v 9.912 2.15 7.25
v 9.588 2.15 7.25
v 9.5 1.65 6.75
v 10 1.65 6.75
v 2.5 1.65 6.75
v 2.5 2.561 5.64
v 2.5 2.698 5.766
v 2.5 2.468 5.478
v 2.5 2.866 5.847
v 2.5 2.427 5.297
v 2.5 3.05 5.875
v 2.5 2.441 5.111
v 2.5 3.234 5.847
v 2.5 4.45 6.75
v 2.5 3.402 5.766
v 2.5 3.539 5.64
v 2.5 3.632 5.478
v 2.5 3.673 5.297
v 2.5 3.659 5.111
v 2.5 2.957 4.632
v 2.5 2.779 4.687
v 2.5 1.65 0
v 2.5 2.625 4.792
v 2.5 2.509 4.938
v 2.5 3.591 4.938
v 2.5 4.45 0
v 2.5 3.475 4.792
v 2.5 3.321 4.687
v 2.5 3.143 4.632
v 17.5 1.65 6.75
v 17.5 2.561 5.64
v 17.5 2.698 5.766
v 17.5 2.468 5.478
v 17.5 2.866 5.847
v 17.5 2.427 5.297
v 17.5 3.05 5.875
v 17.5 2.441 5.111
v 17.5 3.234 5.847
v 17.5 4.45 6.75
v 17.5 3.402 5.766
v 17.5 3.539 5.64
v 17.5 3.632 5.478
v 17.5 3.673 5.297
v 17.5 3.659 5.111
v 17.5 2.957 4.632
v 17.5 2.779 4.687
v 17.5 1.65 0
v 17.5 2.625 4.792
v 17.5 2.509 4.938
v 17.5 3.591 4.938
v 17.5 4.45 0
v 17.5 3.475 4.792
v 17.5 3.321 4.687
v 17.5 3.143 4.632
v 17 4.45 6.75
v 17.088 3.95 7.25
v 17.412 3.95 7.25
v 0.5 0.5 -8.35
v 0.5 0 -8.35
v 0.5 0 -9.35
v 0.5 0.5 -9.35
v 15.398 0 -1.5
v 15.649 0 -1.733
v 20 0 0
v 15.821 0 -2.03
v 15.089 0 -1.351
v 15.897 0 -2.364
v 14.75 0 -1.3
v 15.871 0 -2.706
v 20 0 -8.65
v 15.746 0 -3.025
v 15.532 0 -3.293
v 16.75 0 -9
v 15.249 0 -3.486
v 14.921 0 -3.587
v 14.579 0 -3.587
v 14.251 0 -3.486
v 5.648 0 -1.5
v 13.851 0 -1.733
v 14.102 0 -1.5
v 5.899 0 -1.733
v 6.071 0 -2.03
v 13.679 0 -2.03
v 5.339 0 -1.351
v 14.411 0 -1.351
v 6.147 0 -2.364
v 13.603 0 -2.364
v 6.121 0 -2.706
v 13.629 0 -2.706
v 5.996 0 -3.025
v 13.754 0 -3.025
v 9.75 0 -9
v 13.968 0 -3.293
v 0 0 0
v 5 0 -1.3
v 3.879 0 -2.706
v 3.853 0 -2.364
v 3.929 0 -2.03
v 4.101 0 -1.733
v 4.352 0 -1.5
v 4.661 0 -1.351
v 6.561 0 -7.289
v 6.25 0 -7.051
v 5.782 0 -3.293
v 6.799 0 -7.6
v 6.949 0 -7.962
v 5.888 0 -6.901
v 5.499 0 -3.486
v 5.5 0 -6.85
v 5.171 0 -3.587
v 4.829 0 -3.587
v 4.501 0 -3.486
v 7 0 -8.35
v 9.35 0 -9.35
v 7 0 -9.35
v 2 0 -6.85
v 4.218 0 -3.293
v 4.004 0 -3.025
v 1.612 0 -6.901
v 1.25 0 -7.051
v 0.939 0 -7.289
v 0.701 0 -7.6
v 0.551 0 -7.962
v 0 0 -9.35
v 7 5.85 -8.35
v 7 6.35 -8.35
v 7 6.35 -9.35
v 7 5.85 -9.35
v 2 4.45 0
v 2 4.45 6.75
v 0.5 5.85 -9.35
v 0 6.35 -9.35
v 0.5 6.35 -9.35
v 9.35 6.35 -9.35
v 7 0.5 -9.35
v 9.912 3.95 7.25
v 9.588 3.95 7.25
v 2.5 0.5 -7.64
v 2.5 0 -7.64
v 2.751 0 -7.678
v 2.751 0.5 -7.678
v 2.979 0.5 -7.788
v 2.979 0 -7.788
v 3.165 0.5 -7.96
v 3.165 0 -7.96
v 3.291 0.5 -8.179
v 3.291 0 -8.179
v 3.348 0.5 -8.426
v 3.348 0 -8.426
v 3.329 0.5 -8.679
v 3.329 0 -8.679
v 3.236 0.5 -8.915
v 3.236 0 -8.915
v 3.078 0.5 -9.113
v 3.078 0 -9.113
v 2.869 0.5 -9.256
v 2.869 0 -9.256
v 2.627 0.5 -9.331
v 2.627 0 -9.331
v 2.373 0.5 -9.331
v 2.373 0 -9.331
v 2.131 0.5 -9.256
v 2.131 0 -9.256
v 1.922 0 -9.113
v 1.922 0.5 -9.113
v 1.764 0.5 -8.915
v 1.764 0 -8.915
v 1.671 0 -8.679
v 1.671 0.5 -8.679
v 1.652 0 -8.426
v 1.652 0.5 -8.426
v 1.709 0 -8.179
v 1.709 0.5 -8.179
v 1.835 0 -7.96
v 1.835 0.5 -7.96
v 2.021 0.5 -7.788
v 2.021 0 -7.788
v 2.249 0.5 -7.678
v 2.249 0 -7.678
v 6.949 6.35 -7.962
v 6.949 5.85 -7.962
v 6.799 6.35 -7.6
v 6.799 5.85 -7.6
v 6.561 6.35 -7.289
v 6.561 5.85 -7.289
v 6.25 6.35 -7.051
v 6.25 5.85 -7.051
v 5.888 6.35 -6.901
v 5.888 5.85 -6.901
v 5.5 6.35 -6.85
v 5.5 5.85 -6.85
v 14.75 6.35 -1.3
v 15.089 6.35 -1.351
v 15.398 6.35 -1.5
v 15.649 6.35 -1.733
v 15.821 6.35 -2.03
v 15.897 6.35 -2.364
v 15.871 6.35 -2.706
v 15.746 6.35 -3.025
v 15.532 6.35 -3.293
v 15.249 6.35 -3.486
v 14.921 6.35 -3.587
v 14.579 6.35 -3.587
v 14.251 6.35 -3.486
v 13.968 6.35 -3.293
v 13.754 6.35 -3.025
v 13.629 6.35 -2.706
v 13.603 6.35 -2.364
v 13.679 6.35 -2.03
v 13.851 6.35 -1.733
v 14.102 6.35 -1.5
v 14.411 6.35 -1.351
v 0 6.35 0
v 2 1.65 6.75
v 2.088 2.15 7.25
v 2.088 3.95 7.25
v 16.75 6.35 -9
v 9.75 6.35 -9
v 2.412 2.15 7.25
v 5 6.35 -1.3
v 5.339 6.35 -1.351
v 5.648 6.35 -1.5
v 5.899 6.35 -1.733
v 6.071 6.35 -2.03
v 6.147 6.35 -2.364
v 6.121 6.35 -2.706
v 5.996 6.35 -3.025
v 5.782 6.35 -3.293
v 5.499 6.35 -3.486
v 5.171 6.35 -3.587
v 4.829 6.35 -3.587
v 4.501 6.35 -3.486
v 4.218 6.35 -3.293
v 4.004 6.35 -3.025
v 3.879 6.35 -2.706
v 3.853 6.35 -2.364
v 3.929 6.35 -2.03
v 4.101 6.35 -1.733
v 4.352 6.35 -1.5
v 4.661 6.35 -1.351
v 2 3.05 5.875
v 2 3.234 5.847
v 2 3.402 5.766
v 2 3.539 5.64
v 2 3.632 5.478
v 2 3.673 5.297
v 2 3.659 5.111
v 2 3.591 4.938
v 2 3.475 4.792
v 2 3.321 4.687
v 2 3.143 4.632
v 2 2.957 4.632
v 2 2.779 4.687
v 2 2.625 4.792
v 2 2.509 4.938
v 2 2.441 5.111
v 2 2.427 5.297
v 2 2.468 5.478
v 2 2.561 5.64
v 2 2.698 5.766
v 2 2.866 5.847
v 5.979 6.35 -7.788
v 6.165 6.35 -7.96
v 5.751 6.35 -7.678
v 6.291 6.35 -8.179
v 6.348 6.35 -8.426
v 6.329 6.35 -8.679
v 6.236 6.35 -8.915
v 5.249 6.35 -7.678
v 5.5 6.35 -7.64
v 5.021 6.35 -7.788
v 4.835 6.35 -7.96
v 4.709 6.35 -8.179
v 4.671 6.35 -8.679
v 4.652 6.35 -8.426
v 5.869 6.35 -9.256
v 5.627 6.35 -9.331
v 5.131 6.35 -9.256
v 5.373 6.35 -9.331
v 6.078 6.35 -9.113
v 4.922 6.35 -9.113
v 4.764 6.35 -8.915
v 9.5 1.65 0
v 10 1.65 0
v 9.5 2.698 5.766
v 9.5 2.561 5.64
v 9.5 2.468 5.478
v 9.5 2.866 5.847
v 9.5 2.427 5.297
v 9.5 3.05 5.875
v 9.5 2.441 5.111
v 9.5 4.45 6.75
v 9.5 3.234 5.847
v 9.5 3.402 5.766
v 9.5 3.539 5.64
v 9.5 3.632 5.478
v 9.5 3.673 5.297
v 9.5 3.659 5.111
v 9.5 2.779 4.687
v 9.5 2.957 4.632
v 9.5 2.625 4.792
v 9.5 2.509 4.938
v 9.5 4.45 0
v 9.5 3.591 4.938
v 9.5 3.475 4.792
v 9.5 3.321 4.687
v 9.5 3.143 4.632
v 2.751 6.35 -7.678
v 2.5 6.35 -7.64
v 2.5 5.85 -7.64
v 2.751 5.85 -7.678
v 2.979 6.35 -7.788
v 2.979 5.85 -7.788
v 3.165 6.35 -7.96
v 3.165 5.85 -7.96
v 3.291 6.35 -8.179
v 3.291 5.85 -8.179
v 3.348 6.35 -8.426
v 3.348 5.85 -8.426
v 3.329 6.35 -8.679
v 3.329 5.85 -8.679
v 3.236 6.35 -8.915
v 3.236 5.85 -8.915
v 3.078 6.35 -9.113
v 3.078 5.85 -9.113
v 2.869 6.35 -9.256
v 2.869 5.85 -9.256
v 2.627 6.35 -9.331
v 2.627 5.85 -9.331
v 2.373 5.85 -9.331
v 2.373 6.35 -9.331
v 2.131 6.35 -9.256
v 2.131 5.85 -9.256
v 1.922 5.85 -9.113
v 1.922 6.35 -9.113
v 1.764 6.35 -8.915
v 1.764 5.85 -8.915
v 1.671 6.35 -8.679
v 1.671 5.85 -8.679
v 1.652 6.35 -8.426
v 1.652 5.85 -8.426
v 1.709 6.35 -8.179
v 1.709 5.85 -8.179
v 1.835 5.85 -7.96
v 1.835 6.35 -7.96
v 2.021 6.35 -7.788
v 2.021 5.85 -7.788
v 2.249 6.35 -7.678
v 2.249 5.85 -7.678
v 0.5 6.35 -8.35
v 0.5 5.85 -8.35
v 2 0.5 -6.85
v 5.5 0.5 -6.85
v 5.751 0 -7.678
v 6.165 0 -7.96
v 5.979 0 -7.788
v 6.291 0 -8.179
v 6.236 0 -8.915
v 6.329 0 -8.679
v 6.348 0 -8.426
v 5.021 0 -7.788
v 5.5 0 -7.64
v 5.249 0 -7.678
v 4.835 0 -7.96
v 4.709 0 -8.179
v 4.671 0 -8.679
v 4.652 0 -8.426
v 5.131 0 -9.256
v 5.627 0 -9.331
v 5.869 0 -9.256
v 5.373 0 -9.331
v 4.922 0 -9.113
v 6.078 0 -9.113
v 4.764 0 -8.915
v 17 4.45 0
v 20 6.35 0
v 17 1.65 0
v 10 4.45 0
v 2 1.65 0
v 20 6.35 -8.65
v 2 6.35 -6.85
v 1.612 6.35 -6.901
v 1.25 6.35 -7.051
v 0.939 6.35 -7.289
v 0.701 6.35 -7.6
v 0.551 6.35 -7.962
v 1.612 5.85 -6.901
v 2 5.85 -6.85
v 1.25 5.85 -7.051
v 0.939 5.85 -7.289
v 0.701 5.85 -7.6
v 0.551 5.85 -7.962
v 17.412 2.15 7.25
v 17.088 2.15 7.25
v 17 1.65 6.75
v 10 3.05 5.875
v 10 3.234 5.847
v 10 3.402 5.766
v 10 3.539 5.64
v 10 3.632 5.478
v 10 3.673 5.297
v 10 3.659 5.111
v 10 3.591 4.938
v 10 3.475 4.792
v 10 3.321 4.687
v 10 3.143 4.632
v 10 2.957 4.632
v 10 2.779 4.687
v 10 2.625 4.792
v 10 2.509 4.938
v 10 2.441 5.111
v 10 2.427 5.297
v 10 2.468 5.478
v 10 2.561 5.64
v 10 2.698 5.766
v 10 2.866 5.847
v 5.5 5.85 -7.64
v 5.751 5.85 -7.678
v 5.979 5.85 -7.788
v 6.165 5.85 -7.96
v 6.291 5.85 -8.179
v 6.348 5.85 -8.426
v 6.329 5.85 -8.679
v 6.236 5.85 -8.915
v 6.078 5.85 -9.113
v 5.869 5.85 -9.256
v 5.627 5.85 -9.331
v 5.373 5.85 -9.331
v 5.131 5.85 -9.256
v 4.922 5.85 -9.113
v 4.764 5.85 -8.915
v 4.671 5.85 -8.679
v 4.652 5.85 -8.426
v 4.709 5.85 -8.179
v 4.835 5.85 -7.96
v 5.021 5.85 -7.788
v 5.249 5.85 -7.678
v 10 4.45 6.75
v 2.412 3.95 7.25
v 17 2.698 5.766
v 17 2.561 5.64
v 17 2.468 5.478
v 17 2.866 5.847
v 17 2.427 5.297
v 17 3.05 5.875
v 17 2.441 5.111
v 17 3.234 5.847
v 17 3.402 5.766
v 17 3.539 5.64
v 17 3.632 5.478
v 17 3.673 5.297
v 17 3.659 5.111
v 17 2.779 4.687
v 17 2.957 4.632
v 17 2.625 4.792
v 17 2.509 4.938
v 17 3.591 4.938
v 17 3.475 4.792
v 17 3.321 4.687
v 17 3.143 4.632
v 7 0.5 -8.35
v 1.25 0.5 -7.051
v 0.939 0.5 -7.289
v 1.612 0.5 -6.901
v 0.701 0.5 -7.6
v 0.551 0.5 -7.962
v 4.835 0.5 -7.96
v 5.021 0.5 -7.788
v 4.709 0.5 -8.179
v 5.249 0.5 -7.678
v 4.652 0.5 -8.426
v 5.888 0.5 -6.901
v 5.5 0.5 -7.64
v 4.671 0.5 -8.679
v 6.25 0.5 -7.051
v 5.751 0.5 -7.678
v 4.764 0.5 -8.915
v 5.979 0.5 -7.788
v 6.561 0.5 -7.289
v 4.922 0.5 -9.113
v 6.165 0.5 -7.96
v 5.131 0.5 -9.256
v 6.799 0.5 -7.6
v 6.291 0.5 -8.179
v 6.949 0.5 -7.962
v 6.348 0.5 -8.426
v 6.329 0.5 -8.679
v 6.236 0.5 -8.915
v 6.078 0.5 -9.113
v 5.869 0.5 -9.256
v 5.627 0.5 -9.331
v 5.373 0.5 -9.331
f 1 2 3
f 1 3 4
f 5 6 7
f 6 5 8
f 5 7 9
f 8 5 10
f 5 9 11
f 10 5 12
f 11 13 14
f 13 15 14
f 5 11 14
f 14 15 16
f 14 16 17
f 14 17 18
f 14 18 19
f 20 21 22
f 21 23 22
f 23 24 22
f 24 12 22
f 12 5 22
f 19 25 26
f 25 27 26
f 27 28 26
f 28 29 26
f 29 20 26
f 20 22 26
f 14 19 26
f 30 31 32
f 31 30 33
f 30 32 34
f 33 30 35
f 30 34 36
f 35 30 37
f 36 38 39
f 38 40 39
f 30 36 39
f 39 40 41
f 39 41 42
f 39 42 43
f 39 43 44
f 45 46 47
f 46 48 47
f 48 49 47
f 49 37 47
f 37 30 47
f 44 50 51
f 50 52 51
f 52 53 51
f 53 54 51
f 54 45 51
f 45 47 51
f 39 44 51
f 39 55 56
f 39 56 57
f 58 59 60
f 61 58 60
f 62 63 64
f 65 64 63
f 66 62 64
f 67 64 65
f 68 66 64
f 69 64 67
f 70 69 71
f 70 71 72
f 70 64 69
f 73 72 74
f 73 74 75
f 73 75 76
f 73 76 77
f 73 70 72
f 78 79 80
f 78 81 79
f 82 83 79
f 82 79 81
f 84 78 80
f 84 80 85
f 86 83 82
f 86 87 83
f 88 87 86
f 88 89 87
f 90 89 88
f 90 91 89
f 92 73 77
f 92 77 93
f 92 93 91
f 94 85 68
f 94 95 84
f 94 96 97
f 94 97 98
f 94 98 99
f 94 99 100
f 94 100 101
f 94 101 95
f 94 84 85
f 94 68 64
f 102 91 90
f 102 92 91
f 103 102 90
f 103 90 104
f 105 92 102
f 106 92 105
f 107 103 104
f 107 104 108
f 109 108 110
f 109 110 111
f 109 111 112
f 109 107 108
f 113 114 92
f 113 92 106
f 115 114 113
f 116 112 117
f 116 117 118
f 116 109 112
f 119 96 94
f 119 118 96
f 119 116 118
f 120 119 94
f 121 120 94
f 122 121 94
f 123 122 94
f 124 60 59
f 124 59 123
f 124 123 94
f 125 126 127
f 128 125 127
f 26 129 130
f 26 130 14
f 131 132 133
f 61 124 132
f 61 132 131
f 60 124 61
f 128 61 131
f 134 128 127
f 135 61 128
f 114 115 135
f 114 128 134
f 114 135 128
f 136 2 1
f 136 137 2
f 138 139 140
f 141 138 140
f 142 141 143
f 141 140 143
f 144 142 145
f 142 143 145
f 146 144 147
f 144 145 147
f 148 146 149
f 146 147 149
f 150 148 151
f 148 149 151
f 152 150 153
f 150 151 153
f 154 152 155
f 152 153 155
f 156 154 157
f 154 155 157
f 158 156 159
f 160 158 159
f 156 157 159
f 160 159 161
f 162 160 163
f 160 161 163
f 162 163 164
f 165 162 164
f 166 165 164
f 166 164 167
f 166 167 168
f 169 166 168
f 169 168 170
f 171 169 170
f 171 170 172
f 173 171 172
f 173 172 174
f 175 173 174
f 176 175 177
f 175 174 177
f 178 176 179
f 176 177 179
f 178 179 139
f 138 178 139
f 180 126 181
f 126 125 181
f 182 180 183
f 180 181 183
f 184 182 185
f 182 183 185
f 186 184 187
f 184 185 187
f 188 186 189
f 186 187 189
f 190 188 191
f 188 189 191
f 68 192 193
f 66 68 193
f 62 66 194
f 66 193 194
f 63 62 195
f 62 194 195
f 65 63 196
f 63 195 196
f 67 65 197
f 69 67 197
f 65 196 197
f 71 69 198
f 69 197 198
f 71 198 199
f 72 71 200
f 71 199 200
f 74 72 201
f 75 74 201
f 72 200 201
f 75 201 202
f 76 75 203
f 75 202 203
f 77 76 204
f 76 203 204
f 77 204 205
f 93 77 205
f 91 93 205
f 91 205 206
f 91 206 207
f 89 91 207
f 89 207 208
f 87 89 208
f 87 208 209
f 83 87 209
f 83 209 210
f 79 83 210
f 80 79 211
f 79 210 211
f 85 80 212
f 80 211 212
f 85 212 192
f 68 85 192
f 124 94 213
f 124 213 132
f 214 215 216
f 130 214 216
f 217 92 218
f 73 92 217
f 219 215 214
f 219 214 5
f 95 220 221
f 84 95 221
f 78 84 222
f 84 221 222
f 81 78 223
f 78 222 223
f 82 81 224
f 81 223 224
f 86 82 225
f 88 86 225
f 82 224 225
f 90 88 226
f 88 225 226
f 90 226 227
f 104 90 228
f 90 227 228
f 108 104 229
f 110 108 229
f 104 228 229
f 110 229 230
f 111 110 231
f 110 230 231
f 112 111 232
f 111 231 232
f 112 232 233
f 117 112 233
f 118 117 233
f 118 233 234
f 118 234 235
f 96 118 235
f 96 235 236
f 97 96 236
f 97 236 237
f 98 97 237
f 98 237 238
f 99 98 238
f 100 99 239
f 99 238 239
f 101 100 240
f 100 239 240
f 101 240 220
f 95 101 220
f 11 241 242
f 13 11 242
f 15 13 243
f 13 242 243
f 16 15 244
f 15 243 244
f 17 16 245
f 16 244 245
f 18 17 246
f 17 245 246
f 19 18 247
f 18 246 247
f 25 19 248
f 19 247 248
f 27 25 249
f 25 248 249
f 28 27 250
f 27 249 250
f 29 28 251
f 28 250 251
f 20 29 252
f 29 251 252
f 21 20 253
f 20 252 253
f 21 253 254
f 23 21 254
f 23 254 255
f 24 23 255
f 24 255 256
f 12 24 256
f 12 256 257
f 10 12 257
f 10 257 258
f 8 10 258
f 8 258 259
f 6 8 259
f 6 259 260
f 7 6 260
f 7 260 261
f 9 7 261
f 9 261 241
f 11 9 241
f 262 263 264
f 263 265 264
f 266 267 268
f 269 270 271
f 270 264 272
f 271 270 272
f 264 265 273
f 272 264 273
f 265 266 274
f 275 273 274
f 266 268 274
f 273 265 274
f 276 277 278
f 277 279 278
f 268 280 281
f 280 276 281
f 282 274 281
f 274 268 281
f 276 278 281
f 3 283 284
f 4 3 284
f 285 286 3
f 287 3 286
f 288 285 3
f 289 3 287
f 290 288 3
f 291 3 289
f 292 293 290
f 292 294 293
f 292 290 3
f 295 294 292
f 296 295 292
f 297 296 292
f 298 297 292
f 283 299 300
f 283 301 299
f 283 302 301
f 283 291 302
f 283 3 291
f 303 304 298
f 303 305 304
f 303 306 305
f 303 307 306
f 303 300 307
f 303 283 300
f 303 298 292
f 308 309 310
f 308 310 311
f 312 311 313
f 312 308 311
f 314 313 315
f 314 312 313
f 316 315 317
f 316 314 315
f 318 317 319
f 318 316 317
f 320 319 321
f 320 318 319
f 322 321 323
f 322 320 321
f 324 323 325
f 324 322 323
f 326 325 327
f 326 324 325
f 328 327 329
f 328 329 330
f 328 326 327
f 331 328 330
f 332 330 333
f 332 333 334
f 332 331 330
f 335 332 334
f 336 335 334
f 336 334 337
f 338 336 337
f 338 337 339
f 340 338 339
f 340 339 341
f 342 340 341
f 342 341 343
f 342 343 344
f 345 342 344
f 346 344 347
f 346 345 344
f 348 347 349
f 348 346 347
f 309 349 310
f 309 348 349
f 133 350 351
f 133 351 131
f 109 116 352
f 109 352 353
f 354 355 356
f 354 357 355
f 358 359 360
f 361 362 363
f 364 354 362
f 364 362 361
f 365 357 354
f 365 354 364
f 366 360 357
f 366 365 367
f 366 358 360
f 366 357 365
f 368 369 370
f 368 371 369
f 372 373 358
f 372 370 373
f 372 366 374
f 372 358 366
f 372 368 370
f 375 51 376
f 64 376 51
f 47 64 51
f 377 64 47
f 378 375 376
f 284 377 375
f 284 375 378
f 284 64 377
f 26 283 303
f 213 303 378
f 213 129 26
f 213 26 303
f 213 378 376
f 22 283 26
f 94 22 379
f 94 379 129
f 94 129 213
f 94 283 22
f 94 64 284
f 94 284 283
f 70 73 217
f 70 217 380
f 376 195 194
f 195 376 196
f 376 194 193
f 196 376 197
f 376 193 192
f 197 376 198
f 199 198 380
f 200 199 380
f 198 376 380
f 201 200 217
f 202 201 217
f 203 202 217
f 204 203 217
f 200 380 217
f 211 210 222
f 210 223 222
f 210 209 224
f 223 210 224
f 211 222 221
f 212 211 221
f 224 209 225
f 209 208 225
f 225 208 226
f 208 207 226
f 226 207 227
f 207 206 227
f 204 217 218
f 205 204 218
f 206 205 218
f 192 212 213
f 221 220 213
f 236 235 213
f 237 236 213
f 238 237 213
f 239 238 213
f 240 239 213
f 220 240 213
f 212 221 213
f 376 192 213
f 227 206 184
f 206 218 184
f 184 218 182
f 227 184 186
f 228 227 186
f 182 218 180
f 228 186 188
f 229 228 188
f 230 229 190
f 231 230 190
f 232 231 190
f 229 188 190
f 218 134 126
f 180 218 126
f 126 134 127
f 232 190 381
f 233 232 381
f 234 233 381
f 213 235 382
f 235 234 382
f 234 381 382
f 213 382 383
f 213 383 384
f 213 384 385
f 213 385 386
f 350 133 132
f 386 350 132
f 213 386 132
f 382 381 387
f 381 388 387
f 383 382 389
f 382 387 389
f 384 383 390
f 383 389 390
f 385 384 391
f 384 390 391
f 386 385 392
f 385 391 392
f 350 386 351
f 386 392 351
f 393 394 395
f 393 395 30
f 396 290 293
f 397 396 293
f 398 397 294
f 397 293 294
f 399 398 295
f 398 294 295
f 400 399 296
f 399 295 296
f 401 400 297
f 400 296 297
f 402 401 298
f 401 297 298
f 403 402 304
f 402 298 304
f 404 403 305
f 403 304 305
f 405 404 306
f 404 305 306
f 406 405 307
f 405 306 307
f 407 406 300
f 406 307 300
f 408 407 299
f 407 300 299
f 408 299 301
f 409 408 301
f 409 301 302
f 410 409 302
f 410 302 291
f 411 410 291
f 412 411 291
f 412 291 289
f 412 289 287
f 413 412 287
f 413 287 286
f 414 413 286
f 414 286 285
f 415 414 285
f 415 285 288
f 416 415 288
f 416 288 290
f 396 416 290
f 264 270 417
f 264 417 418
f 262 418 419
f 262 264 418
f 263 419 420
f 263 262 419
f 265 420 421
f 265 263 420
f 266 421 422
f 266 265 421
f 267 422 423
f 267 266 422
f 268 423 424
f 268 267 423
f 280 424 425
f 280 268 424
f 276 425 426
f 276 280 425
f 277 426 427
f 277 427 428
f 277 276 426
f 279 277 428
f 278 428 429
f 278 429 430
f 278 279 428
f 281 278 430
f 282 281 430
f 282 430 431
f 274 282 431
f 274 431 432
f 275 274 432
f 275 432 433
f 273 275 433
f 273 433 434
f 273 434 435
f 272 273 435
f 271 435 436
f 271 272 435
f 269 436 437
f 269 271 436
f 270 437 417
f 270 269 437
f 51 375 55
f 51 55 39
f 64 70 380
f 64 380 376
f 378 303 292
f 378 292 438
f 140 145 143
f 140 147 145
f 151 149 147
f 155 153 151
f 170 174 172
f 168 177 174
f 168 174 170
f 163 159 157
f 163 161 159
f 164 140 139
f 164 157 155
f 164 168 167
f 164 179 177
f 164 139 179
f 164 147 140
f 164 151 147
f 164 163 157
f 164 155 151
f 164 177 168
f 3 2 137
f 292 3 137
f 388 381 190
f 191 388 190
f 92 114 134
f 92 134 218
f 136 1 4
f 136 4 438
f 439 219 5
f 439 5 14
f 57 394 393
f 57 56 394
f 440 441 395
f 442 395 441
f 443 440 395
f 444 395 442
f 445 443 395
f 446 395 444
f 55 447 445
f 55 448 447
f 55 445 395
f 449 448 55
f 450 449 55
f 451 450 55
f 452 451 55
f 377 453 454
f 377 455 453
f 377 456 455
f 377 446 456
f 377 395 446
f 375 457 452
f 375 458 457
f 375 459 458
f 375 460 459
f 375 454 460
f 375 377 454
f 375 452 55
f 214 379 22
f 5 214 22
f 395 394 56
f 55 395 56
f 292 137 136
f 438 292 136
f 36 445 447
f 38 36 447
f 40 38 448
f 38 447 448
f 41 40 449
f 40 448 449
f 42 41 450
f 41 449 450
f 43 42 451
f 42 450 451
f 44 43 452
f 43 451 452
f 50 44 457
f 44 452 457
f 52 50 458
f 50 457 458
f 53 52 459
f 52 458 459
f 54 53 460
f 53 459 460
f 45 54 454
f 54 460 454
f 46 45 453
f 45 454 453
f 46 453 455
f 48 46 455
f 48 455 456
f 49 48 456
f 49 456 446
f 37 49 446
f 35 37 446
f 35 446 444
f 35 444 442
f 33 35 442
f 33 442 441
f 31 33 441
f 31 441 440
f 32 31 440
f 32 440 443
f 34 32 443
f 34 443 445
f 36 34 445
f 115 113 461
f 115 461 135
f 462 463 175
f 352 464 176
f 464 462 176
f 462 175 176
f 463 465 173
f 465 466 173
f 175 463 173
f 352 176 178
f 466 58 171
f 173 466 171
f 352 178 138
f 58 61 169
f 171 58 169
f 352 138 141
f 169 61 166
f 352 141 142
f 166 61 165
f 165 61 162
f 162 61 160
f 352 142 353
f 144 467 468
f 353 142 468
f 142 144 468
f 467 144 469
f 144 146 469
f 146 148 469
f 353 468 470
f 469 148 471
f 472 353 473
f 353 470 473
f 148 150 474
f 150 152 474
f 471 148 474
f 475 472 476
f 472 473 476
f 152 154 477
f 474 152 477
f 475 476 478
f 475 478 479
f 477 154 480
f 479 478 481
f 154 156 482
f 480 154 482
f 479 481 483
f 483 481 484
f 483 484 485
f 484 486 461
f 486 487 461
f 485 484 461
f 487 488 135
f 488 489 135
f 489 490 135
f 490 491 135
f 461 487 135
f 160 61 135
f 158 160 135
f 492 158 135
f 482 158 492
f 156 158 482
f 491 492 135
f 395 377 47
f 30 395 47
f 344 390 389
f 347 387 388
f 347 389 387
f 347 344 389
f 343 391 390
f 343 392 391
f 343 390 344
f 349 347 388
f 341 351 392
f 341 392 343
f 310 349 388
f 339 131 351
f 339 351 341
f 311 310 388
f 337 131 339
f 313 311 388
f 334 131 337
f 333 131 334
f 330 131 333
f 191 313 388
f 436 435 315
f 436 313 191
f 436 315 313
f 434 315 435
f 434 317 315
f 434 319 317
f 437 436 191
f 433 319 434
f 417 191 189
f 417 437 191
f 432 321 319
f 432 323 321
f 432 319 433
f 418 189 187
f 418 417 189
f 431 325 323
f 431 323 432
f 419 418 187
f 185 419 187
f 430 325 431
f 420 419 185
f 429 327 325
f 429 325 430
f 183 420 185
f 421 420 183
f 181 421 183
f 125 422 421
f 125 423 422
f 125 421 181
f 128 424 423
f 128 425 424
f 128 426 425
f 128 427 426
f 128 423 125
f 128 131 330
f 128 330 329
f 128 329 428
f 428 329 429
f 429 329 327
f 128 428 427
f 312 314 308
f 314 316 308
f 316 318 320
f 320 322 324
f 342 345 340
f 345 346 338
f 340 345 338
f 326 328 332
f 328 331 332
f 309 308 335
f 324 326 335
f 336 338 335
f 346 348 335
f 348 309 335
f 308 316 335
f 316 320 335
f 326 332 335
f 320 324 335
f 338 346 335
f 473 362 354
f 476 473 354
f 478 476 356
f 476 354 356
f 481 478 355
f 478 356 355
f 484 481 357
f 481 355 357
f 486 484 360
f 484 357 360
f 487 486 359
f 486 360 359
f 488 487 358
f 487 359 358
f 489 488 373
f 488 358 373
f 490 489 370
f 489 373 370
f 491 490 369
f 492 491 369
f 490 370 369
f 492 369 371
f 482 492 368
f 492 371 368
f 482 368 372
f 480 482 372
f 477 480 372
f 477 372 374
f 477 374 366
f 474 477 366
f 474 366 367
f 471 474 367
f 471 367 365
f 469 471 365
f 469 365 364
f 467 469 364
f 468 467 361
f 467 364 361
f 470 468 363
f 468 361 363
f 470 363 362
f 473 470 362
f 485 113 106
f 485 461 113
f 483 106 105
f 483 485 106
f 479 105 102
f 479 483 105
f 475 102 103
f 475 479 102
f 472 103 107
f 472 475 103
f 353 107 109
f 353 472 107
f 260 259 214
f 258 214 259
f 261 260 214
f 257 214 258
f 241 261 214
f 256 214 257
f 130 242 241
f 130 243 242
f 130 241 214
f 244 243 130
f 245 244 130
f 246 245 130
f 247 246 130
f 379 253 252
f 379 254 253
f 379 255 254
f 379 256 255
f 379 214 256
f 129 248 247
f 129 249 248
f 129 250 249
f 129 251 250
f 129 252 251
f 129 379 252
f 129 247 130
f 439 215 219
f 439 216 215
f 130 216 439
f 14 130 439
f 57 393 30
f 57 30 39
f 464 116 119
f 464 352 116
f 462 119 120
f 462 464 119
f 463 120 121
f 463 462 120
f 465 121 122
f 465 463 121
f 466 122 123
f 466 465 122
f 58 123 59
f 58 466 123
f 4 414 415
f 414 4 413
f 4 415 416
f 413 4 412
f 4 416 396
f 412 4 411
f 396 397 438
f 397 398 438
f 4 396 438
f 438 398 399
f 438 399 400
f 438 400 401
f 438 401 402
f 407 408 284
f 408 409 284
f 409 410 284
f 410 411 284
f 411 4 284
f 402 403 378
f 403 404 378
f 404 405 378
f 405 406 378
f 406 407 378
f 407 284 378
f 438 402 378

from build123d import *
from OCP.BRepFilletAPI import BRepFilletAPI_MakeChamfer

# Parameters (mm, degrees)
BOSS_EXTRUDE1_DEPTH = 6.35
SKETCH2_R           = 1.15
CUT_EXTRUDE1_DEPTH  = 6.35
SKETCH3_W           = 0.5
SKETCH3_H           = 2.8
BOSS_EXTRUDE2_DEPTH = 7.25
SKETCH4_R           = 0.625
CUT_EXTRUDE2_DEPTH  = 16.25
CHAMFER1_SIZE       = 0.5
CHAMFER2_SIZE       = 0.5
CHAMFER2_SIZE2      = 0.08816349
SKETCH5_W           = 6.5
SKETCH5_H           = 2.5
SKETCH5_R           = 0.85
CUT_EXTRUDE4_DEPTH  = 0.5
FILLET1_R           = 1.5


with BuildPart() as part:
    # Sketch1 → Boss-Extrude1 (new body)
    with BuildSketch(Plane(origin=(0, 0, 0), x_dir=(1, 0, 0), z_dir=(0, 1, 0))):
        Polygon((9.35, 9.35), (9.75, 9), (16.75, 9), (20, 8.65), (20, 0), (0, 0), (0, 9.35), align=None)
    extrude(amount=BOSS_EXTRUDE1_DEPTH)

    # Sketch2 → Cut-Extrude1 (cut)
    with BuildSketch(Plane(origin=(0, 6.35, 0), x_dir=(1, 0, 0), z_dir=(0, 1, 0))):
        with Locations(Location((14.75, 2.45, 0), (0, 0, 270))):
            Circle(SKETCH2_R)
        with Locations(Location((5, 2.45, 0), (0, 0, 270))):
            Circle(SKETCH2_R)
    extrude(amount=-CUT_EXTRUDE1_DEPTH, mode=Mode.SUBTRACT)

    # Sketch3 → Boss-Extrude2 (add)
    with BuildSketch(Plane.XY):
        with Locations((2.25, 3.05)):
            Rectangle(SKETCH3_W, SKETCH3_H)
        with Locations((9.75, 3.05)):
            Rectangle(SKETCH3_W, SKETCH3_H)
        with Locations((17.25, 3.05)):
            Rectangle(SKETCH3_W, SKETCH3_H)
    extrude(amount=BOSS_EXTRUDE2_DEPTH)

    # Sketch4 → Cut-Extrude2 (cut)
    with BuildSketch(Plane.ZY.offset(-2)):
        with Locations((5.25, 3.05)):
            Circle(SKETCH4_R)
    extrude(amount=-CUT_EXTRUDE2_DEPTH, mode=Mode.SUBTRACT)

    # Chamfer1
    chamfer1_edges = [part.edges().sort_by_distance(p)[0] for p in [
        (2.25, 4.45, 7.25),
        (2.25, 1.65, 7.25),
        (9.75, 1.65, 7.25),
        (9.75, 4.45, 7.25),
        (17.25, 1.65, 7.25),
        (17.25, 4.45, 7.25),
    ]]
    chamfer(chamfer1_edges, length=CHAMFER1_SIZE)

    # Chamfer2: one chamfer whose edges measure the first distance from different faces: ONE call of the kernel's chamfer builder (chamfer() names one face for all edges)
    chamfer2_edges_1 = [part.edges().sort_by_distance(p)[0] for p in [
        (2.5, 3.05, 7.25),
    ]]
    chamfer2_side_1 = [part.faces().sort_by_distance(p)[0] for p in [
        (2.5, 3.05, 3.473122701),
    ]]
    chamfer2_edges_2 = [part.edges().sort_by_distance(p)[0] for p in [
        (2, 3.05, 7.25),
    ]]
    chamfer2_side_2 = [part.faces().sort_by_distance(p)[0] for p in [
        (2, 3.05, 3.473122701),
    ]]
    chamfer2_edges_3 = [part.edges().sort_by_distance(p)[0] for p in [
        (9.5, 3.05, 7.25),
    ]]
    chamfer2_side_3 = [part.faces().sort_by_distance(p)[0] for p in [
        (9.5, 3.05, 3.473122701),
    ]]
    chamfer2_edges_4 = [part.edges().sort_by_distance(p)[0] for p in [
        (10, 3.05, 7.25),
    ]]
    chamfer2_side_4 = [part.faces().sort_by_distance(p)[0] for p in [
        (10, 3.05, 3.473122701),
    ]]
    chamfer2_edges_5 = [part.edges().sort_by_distance(p)[0] for p in [
        (17, 3.05, 7.25),
    ]]
    chamfer2_side_5 = [part.faces().sort_by_distance(p)[0] for p in [
        (17, 3.05, 3.473122701),
    ]]
    chamfer2_edges_6 = [part.edges().sort_by_distance(p)[0] for p in [
        (17.5, 3.05, 7.25),
    ]]
    chamfer2_side_6 = [part.faces().sort_by_distance(p)[0] for p in [
        (17.5, 3.05, 3.473122701),
    ]]
    chamfer2 = BRepFilletAPI_MakeChamfer(part.part.solid().wrapped)
    for e in chamfer2_edges_1:
        chamfer2.Add(CHAMFER2_SIZE, CHAMFER2_SIZE2, e.wrapped, chamfer2_side_1[0].wrapped)  # the first distance lies on this face
    for e in chamfer2_edges_2:
        chamfer2.Add(CHAMFER2_SIZE, CHAMFER2_SIZE2, e.wrapped, chamfer2_side_2[0].wrapped)  # the first distance lies on this face
    for e in chamfer2_edges_3:
        chamfer2.Add(CHAMFER2_SIZE, CHAMFER2_SIZE2, e.wrapped, chamfer2_side_3[0].wrapped)  # the first distance lies on this face
    for e in chamfer2_edges_4:
        chamfer2.Add(CHAMFER2_SIZE, CHAMFER2_SIZE2, e.wrapped, chamfer2_side_4[0].wrapped)  # the first distance lies on this face
    for e in chamfer2_edges_5:
        chamfer2.Add(CHAMFER2_SIZE, CHAMFER2_SIZE2, e.wrapped, chamfer2_side_5[0].wrapped)  # the first distance lies on this face
    for e in chamfer2_edges_6:
        chamfer2.Add(CHAMFER2_SIZE, CHAMFER2_SIZE2, e.wrapped, chamfer2_side_6[0].wrapped)  # the first distance lies on this face
    add(Compound.cast(chamfer2.Shape()), mode=Mode.REPLACE)

    # Sketch5 → Cut-Extrude4 (cut)
    with BuildSketch(Plane(origin=(0, 6.35, 0), x_dir=(1, 0, 0), z_dir=(0, 1, 0))):
        with Locations((3.75, 8.1)):
            Rectangle(SKETCH5_W, SKETCH5_H)
        with Locations(Location((2.5, 8.49, 0), (0, 0, 270))):
            Circle(SKETCH5_R, mode=Mode.SUBTRACT)
        with Locations(Location((5.5, 8.49, 0), (0, 0, 270))):
            Circle(SKETCH5_R, mode=Mode.SUBTRACT)
    cut_extrude4 = extrude(amount=-CUT_EXTRUDE4_DEPTH, mode=Mode.SUBTRACT)

    # Mirror1: Cut-Extrude4 across plane
    add(cut_extrude4.mirror(Plane(origin=(0, 3.175, 0), x_dir=(0, 0, 1), z_dir=(0, -1, 0))), mode=Mode.SUBTRACT)

    # Fillet1
    fillet1_edges = [part.edges().sort_by_distance(p)[0] for p in [
        (0.5, 6.1, -6.85),
        (7, 6.1, -6.85),
        (0.5, 0.25, -6.85),
        (7, 0.25, -6.85),
    ]]
    fillet(fillet1_edges, radius=FILLET1_R)


solid = part.part
